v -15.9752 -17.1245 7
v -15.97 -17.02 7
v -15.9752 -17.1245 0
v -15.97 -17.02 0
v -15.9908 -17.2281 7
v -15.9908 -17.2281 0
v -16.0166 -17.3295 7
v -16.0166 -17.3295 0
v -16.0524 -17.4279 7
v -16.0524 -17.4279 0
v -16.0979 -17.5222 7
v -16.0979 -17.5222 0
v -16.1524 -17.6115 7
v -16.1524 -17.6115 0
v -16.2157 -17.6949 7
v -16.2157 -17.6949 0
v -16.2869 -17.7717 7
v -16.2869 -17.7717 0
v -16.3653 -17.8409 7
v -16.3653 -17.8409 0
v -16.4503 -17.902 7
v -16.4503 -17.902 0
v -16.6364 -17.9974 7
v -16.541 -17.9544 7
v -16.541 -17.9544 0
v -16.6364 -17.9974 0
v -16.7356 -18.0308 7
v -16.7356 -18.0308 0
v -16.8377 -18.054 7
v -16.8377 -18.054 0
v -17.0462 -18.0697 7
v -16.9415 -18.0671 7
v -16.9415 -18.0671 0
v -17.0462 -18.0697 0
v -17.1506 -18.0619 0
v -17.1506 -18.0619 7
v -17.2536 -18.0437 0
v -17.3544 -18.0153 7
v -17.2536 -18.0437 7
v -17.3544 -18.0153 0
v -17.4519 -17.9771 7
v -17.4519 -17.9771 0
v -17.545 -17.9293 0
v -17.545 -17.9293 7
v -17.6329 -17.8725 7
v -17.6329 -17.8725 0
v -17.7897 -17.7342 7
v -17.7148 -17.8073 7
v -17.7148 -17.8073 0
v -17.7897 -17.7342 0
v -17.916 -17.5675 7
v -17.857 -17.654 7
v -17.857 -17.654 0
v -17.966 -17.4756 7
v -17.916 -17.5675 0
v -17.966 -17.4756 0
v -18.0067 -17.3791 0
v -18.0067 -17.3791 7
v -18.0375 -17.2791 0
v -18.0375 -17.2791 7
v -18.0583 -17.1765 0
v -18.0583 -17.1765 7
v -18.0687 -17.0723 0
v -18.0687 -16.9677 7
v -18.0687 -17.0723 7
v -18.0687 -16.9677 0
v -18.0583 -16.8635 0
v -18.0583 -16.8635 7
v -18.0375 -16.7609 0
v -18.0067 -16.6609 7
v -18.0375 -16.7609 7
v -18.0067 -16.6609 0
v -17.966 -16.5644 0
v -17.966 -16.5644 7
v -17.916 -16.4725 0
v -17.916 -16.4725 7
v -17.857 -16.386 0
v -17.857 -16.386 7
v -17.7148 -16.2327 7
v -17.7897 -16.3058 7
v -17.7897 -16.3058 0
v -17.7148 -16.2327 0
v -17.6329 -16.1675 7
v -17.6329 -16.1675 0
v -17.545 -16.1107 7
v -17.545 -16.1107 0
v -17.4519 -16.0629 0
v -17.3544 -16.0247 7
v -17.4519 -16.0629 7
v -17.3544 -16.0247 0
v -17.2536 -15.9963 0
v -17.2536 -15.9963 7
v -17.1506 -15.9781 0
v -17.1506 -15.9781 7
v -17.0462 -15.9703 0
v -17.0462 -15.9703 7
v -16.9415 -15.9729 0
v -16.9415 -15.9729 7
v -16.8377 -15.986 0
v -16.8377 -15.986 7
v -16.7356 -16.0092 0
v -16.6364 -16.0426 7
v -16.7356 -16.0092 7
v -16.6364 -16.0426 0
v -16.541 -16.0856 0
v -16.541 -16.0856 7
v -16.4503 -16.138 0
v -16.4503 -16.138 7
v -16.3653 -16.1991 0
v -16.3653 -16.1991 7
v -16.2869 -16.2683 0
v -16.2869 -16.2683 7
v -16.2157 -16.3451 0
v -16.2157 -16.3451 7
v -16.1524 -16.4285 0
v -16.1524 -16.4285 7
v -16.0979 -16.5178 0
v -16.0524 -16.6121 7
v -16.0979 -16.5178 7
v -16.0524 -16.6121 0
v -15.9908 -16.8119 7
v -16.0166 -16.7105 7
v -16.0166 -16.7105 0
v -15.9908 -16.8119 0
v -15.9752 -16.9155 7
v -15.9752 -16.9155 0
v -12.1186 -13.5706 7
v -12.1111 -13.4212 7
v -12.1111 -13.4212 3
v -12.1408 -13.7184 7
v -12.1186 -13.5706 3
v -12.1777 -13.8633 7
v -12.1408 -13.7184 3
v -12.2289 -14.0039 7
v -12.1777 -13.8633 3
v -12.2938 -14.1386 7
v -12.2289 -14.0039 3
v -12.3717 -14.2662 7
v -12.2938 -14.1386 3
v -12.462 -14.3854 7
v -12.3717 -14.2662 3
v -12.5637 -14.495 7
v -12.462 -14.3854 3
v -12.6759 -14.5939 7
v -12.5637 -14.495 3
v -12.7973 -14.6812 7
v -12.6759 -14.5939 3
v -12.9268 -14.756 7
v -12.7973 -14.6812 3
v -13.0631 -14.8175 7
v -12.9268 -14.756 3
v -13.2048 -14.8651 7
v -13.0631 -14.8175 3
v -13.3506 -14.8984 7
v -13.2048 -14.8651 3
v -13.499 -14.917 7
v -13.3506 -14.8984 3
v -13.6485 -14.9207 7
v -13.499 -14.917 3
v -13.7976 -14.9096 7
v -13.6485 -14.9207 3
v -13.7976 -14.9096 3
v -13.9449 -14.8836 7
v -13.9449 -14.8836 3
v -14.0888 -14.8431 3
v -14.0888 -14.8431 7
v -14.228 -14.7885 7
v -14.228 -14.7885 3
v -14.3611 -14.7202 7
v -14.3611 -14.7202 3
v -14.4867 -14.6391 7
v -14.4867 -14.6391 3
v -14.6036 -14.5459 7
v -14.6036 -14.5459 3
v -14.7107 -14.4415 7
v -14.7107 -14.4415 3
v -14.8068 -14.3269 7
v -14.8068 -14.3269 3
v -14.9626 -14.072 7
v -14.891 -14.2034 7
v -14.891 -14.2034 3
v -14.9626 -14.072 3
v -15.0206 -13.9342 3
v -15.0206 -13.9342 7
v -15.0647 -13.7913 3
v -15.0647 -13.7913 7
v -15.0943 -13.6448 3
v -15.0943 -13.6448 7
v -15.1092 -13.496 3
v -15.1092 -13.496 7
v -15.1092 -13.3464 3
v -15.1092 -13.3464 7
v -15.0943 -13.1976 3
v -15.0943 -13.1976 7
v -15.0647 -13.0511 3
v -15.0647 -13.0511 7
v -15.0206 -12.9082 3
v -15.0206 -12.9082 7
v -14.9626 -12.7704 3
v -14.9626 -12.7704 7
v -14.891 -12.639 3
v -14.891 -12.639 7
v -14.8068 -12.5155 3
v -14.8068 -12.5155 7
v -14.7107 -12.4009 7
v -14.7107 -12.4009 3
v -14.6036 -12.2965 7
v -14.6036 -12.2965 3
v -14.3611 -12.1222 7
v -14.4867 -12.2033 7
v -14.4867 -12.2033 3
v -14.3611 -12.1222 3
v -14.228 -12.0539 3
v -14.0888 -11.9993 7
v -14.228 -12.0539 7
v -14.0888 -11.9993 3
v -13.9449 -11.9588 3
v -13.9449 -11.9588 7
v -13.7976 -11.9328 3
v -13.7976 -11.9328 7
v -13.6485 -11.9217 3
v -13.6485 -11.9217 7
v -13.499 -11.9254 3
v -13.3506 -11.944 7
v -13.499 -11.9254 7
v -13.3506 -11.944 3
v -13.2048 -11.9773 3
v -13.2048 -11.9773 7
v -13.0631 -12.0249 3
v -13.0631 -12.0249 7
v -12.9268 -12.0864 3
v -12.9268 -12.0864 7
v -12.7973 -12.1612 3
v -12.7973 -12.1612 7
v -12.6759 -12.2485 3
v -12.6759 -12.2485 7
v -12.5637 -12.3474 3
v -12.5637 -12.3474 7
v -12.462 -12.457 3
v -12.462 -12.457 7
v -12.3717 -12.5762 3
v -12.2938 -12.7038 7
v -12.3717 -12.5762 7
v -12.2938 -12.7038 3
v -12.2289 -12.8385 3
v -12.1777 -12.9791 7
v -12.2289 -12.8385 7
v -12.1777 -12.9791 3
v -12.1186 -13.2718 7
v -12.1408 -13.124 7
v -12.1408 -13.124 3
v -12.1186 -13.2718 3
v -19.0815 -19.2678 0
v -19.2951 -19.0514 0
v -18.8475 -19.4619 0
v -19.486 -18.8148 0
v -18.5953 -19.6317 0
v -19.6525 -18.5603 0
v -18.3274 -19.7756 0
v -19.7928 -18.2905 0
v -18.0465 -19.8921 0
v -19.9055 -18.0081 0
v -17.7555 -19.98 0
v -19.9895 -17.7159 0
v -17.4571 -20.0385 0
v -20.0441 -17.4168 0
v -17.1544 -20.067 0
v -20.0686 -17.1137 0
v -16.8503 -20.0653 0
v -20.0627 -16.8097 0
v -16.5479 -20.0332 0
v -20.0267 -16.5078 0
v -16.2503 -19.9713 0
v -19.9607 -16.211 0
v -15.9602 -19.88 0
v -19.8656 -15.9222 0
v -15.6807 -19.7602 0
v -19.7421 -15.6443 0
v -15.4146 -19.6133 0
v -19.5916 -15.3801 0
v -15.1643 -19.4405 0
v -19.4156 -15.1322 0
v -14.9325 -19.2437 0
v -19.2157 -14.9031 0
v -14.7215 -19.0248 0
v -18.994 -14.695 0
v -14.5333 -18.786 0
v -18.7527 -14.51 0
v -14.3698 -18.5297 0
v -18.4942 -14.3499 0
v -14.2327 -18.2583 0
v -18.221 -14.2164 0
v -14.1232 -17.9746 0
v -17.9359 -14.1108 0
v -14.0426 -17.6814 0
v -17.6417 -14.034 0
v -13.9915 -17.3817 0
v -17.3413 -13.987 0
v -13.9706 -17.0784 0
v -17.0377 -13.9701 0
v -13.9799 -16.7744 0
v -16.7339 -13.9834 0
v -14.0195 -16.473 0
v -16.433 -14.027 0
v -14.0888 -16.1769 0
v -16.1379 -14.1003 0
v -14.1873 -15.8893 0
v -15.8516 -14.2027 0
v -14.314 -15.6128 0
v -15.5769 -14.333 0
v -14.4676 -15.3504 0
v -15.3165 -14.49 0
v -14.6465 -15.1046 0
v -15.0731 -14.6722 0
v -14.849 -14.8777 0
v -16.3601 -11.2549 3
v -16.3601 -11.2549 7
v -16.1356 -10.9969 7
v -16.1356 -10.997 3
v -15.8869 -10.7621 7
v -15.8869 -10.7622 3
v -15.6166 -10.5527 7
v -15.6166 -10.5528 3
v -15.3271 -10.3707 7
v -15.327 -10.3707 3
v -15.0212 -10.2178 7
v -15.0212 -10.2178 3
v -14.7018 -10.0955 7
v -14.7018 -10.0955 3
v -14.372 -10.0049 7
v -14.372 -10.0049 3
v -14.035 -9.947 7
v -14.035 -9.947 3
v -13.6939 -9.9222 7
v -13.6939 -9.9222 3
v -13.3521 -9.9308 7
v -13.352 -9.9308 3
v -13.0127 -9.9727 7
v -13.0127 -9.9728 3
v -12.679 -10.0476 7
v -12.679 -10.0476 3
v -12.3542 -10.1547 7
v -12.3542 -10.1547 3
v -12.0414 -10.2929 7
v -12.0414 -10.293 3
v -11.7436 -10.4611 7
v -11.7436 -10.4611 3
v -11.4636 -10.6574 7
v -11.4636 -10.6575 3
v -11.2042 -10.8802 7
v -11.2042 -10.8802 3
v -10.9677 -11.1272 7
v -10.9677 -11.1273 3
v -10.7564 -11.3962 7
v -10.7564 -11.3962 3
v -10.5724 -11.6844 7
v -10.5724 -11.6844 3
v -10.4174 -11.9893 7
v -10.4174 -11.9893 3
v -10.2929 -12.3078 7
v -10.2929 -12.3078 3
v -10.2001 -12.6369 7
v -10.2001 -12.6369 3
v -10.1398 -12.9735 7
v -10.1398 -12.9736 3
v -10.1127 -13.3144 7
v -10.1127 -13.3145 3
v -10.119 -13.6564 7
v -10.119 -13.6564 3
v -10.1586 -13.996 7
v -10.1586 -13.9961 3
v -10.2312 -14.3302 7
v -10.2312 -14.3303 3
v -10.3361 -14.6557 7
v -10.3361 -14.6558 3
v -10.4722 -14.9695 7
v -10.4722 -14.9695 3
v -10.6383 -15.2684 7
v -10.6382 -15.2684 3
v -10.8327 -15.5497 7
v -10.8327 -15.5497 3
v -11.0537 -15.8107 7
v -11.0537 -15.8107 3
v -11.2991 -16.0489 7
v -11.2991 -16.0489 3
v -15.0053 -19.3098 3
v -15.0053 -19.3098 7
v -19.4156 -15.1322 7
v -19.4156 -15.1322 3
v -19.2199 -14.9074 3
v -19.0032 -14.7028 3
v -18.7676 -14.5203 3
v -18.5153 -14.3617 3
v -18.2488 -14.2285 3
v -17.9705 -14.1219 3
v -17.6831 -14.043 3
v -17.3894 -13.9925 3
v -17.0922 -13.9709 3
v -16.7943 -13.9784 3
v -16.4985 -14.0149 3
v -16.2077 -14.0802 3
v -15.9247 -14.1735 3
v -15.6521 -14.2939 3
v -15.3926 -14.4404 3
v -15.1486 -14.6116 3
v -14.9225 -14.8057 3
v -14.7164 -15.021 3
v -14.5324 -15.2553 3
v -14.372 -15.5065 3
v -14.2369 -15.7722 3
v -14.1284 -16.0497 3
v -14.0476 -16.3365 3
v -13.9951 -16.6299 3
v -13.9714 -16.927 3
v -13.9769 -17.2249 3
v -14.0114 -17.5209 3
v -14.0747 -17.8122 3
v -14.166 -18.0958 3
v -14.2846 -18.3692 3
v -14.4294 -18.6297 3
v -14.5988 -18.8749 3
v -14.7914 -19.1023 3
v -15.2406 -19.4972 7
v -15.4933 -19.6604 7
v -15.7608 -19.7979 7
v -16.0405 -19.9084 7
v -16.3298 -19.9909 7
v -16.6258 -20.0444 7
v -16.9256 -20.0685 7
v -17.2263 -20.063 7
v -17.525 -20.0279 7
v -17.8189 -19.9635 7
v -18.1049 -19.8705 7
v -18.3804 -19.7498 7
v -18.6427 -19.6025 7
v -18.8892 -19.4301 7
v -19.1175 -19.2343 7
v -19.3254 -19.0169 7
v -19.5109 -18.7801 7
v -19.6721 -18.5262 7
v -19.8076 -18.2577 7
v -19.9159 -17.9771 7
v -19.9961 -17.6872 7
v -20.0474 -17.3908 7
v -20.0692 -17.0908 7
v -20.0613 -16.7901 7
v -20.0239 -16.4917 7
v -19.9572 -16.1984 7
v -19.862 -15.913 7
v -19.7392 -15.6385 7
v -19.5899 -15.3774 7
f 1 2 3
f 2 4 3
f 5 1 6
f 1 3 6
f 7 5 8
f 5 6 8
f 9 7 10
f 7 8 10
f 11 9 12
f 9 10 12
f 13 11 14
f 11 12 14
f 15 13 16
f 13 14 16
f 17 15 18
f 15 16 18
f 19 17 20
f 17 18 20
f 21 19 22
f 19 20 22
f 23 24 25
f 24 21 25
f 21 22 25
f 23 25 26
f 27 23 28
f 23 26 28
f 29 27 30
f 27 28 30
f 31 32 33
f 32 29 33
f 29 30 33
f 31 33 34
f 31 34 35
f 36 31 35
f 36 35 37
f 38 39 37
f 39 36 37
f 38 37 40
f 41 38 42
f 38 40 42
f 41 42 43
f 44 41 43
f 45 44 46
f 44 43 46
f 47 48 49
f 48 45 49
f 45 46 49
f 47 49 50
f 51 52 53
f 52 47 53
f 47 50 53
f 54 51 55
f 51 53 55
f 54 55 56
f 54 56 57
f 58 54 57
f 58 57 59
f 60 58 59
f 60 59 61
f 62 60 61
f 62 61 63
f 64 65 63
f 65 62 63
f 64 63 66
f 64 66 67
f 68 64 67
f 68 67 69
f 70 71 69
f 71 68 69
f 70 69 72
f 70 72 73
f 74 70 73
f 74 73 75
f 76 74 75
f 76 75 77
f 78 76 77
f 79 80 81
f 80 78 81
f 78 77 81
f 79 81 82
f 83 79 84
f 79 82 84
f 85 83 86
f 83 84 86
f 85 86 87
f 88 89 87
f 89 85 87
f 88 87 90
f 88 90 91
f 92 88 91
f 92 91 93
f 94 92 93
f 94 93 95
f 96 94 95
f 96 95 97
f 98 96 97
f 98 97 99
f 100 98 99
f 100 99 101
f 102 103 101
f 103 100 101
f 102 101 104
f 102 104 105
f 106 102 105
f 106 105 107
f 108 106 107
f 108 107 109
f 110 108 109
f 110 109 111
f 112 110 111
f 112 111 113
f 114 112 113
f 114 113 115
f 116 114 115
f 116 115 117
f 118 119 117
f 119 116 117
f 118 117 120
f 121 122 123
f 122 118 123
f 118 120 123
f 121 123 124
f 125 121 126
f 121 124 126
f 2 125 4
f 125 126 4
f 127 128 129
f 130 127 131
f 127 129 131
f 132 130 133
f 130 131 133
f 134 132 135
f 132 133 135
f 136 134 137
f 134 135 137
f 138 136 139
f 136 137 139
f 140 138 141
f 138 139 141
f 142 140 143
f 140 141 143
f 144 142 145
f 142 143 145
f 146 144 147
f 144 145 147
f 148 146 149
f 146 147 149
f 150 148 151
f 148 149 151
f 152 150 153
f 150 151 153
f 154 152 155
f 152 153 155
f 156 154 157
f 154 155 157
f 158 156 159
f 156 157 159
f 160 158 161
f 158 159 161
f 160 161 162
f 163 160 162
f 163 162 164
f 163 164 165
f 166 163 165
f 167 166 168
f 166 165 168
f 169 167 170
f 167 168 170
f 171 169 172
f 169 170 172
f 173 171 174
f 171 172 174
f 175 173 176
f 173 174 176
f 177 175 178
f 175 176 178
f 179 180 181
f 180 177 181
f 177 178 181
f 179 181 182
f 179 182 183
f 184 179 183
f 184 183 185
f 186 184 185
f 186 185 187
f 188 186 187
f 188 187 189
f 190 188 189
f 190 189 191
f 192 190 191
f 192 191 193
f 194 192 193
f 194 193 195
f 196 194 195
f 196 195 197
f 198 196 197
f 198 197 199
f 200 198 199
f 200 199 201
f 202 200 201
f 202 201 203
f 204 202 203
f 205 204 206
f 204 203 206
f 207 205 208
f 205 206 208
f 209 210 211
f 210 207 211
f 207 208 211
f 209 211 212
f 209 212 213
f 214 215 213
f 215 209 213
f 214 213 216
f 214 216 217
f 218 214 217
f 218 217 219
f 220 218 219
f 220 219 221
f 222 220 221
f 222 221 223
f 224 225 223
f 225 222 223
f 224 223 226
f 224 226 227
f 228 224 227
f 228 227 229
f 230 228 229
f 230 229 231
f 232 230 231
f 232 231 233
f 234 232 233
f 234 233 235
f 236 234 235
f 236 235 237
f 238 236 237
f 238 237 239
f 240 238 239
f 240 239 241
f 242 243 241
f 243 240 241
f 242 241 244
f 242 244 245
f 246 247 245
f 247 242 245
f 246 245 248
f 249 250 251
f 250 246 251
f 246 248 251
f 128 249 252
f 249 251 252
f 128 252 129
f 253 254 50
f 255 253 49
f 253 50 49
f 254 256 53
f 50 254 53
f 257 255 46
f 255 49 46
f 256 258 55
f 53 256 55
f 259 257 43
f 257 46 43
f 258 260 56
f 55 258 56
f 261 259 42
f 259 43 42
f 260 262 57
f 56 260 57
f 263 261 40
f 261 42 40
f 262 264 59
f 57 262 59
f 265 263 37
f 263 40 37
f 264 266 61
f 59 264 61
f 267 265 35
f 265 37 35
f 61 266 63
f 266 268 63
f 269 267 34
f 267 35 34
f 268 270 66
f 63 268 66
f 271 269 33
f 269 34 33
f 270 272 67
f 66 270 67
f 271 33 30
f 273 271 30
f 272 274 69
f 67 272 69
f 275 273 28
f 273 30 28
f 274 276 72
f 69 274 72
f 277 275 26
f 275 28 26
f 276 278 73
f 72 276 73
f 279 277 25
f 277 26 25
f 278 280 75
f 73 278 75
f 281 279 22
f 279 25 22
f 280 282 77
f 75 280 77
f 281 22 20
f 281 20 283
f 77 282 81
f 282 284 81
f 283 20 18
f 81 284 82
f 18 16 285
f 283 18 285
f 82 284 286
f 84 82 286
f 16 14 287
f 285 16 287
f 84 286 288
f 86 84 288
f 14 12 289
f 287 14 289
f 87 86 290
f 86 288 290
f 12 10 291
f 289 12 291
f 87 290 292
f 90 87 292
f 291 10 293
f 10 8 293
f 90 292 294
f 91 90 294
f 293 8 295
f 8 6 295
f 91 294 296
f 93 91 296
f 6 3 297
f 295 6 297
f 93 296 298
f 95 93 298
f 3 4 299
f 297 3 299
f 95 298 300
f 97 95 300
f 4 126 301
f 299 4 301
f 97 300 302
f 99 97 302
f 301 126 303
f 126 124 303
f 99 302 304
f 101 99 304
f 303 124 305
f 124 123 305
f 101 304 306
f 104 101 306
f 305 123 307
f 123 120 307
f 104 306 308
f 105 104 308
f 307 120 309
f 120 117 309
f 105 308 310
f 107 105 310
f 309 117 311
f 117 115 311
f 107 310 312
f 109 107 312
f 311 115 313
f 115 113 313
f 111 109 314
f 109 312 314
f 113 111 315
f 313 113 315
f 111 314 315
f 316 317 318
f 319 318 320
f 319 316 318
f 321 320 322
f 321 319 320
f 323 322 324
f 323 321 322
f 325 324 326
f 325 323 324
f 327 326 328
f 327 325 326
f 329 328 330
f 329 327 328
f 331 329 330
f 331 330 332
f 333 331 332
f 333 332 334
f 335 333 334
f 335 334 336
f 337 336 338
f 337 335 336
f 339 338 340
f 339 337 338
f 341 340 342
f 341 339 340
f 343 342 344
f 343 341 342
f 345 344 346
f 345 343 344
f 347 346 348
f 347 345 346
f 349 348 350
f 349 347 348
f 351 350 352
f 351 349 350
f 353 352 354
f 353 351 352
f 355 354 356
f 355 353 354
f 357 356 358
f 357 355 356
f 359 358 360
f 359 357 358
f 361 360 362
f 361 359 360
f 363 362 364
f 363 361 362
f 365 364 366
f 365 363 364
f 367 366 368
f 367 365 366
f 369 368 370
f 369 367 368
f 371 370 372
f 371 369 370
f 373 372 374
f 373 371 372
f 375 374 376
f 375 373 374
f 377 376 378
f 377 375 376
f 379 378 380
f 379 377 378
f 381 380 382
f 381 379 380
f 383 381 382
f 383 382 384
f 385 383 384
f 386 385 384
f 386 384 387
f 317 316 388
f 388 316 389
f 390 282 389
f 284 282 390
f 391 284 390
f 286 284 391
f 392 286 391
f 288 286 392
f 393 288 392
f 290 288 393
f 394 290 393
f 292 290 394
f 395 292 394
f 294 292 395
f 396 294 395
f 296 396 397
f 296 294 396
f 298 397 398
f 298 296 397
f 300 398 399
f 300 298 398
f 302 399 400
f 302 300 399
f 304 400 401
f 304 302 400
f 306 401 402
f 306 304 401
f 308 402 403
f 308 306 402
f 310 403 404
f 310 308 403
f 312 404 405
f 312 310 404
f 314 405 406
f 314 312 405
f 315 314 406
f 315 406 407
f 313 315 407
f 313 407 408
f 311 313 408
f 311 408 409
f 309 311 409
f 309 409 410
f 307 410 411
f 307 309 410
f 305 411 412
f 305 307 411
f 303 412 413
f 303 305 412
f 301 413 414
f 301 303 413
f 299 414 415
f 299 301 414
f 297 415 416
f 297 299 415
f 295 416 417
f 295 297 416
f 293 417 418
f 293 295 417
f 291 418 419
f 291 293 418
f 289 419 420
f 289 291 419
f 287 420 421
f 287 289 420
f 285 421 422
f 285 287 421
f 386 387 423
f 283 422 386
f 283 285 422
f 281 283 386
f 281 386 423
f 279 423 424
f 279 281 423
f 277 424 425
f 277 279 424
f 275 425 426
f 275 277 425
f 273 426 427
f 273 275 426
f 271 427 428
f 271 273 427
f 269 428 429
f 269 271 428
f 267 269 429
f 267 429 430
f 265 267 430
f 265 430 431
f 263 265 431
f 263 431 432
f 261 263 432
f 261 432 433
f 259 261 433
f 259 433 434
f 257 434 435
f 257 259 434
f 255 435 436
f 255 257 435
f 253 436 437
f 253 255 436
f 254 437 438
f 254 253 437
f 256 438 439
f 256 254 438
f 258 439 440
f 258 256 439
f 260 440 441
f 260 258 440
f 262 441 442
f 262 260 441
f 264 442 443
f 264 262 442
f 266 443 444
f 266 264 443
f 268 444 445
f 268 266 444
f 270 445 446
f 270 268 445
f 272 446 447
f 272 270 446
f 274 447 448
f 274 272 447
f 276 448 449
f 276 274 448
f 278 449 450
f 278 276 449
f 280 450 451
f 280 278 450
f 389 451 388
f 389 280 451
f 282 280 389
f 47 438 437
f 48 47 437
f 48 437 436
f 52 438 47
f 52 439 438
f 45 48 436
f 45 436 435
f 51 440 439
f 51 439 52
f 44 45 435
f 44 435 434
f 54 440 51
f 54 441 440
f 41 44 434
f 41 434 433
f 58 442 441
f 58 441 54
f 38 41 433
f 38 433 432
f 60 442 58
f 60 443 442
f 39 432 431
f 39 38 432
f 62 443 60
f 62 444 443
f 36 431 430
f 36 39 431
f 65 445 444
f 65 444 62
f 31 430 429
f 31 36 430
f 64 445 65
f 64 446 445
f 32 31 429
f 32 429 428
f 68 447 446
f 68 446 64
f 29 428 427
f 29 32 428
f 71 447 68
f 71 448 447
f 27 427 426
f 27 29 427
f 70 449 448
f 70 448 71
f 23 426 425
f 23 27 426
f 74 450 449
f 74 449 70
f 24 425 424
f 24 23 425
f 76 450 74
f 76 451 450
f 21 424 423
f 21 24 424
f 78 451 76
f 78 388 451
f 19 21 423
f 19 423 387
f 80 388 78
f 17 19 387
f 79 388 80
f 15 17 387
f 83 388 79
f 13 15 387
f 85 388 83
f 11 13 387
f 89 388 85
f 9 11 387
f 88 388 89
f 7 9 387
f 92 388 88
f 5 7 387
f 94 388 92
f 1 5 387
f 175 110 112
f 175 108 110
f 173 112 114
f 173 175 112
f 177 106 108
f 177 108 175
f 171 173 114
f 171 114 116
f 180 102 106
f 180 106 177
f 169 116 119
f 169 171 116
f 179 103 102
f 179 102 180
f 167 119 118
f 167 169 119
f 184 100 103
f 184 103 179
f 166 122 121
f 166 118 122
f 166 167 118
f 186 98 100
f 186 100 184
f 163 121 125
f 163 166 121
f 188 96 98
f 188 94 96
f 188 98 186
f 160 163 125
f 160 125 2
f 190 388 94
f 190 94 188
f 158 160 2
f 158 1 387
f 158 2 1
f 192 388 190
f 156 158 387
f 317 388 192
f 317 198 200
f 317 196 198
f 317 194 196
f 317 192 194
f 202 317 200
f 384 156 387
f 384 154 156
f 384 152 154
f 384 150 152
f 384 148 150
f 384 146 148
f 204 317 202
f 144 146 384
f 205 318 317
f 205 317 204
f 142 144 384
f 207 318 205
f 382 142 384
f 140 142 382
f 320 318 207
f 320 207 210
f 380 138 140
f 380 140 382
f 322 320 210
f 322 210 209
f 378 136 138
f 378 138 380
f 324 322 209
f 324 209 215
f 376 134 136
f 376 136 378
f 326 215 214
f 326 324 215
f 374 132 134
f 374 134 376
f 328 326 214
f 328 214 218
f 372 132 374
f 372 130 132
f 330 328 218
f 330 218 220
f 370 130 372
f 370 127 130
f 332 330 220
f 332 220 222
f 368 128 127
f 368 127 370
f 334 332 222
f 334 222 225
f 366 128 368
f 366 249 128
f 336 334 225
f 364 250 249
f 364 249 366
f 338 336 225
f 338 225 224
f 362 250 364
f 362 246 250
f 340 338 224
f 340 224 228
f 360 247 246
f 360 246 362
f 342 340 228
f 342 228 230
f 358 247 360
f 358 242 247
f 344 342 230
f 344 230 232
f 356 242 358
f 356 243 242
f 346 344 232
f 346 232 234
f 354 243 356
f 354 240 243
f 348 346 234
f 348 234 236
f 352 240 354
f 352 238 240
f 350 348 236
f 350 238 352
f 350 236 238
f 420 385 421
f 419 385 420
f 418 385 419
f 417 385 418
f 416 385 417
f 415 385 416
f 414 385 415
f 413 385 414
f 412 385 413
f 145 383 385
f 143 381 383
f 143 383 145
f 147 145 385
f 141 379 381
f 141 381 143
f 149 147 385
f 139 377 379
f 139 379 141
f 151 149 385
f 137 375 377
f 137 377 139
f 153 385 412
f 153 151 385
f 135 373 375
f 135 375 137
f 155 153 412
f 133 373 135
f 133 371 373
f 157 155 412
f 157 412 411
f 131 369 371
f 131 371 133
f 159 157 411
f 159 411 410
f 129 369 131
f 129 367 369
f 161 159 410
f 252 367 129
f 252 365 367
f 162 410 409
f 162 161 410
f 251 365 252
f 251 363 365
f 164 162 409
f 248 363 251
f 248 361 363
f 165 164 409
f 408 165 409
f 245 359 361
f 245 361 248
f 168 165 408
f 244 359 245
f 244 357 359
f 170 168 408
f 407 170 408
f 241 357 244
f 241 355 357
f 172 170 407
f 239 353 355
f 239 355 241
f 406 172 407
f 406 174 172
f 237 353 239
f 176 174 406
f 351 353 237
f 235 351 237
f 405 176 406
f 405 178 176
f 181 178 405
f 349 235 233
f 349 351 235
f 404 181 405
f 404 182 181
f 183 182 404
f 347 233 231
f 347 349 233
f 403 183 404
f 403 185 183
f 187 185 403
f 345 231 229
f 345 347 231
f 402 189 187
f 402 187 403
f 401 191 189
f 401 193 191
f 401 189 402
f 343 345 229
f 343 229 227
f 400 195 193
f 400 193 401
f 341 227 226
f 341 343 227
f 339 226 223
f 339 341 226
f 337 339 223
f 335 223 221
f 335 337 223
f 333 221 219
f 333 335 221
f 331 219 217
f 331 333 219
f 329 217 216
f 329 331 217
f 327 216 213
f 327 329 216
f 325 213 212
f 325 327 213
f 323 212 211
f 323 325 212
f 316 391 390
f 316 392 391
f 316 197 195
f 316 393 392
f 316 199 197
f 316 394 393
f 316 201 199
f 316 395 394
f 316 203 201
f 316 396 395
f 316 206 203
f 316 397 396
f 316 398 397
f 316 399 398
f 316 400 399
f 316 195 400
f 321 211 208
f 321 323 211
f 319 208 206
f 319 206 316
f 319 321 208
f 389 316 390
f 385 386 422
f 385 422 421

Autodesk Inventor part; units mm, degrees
ref_plane "YZ Plane" through (0, 0, 0) normal (1, 0, 0) x (0, 1, 0)
ref_plane "XZ Plane" through (0, 0, 0) normal (0, 1, 0) x (-1, 0, 0)
sketch "Base" plane through (0, 0, 0) normal (0, 0, 1) x (1, 0, 0)
  circle A0 centre (-17.02, -17.02) radius 1.05 projected
  arc A1 (-12.5579, -14.4893) -> (-14.6643, -12.3531) centre (-13.6111, -13.4212) ccw construction
  line L0 (-13.6111, -13.4212) -> (-17.02, -17.02) construction
  circle A2 centre (-13.6111, -13.4212) radius 1.5
  circle A3 centre (-13.6111, -13.4212) radius 3.5
  circle A4 centre (-17.02, -17.02) radius 3.05
  line L1 (-11.2991, -16.0489) -> (-15.0053, -19.3098)
  line L2 (-16.3601, -11.2549) -> (-19.4156, -15.1322)
  point P0 (0, 0)
  point P1 (-15.3155, -15.2206)
  dimension "d3" = 2
  dimension "d4" = 2
extrude "BaseFeature" add sketch "Base" along normal blind 7
ref_plane "RisePlane" through (0, 0, 3) normal (0, 0, 1) x (1, 0, 0)
sketch "RiseProfile" plane through (0, 0, 0) normal (0, 0, -1) x (-1, 0, 0)
  arc A0 (15.0053, -19.3098) -> (19.4156, -15.1322) centre (17.02, -17.02) ccw projected
  line L0 (16.3601, -11.2549) -> (19.4156, -15.1322) projected
  circle A1 centre (17.02, -17.02) radius 3.05
  line L1 (15.0053, -19.3098) -> (11.2991, -16.0489) projected
  arc A2 (16.3601, -11.2549) -> (11.2991, -16.0489) centre (13.6111, -13.4212) ccw projected
  point P0 (0, 0)
  point P1 (15.0053, -19.3098)
extrude "RiseFeature" cut sketch "RiseProfile" against normal up to surface (3 mm away) contours L1 A2 L0 A1
properties part number "IRLedMount"
